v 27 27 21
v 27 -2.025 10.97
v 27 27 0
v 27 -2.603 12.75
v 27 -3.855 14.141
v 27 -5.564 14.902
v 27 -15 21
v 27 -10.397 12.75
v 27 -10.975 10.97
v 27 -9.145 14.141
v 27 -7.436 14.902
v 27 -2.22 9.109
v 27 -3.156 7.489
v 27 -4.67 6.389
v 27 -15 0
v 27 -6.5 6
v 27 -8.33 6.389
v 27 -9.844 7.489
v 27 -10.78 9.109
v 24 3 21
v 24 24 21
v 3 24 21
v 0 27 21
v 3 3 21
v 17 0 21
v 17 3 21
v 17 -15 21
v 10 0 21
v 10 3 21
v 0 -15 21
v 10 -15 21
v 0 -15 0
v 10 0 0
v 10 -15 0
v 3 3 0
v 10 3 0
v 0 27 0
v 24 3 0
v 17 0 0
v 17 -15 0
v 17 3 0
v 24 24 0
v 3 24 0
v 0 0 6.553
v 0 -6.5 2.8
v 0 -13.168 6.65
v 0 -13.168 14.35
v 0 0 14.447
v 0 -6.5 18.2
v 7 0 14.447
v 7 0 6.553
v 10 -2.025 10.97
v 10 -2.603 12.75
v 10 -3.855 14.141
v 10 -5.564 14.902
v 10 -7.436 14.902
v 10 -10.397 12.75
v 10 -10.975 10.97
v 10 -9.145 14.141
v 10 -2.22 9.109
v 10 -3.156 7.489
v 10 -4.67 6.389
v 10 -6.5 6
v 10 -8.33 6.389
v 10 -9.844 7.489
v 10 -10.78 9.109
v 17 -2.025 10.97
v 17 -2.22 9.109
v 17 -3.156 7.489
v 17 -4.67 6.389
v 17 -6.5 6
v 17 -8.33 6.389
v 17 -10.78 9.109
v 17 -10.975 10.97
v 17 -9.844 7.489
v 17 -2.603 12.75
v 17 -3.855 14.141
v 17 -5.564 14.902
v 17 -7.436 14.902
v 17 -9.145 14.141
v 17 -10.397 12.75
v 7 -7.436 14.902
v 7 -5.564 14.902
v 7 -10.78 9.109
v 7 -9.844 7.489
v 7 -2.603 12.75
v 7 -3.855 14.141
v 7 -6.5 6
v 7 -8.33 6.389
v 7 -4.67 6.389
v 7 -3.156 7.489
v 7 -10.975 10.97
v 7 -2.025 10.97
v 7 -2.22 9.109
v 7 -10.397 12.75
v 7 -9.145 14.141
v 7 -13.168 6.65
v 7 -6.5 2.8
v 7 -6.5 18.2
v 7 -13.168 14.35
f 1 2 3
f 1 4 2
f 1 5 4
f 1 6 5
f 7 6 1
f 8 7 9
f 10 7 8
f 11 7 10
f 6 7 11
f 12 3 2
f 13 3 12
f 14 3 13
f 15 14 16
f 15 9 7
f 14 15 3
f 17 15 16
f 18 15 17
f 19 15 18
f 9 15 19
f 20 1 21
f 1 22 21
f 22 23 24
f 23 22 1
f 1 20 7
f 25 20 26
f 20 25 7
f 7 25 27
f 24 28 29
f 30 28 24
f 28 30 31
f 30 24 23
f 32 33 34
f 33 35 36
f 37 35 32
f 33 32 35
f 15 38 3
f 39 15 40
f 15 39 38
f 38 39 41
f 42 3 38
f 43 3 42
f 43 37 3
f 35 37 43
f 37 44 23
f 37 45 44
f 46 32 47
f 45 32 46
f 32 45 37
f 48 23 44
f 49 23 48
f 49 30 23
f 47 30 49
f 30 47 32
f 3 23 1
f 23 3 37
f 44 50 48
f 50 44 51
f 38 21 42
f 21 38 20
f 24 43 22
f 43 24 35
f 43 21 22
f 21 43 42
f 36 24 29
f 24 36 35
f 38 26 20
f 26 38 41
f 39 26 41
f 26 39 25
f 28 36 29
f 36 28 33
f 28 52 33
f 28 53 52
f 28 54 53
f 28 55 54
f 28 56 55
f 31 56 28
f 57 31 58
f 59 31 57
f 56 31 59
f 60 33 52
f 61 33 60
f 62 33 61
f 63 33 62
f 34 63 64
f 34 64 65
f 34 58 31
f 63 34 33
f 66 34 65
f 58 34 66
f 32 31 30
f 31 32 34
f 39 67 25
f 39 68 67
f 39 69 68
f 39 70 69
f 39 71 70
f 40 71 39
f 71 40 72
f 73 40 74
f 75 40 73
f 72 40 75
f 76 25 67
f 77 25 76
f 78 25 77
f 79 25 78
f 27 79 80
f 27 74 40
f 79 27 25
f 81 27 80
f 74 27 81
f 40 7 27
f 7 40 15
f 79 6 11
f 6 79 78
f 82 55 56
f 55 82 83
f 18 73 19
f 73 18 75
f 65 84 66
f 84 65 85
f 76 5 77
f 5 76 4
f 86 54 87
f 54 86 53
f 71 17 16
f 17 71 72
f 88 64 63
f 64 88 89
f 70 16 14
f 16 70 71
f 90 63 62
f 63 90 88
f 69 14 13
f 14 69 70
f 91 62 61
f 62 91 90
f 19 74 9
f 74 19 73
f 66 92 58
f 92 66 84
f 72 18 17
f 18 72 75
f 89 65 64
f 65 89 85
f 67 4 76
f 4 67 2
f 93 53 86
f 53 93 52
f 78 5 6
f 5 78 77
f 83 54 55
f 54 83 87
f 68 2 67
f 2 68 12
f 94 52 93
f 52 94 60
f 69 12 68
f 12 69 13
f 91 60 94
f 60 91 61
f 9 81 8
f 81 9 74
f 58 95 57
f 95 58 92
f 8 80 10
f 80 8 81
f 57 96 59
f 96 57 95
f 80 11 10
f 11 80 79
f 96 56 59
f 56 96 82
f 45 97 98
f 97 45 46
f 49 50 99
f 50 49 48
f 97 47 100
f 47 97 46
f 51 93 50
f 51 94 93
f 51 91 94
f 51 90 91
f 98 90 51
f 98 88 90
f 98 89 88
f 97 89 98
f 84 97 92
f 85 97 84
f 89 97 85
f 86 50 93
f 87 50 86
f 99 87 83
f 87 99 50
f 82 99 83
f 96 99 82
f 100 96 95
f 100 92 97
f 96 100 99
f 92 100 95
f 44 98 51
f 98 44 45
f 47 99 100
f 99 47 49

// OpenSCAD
$d = 21;



difference(){
    cube([$d+6,$d+6,$d]);
    translate([3,3,0])
    cube([$d,$d,$d]);
    translate([10,0,0])
    cube([$d-20+6,3,$d]);
}


difference(){
    union(){
    translate([0,-15,0])
    cube([10,15,$d]);
    translate([$d-10+6,-15,0])
    cube([10,15,$d]);
    }
    
    translate([0,-6.5,$d/2])
    rotate([0,90,0])
    cylinder(h=$d+6, r=4.5);
    
    translate([0,-6.5,$d/2])
    rotate([0,90,0])
    cylinder(h=7, r=7.7, $fn=6);
}
